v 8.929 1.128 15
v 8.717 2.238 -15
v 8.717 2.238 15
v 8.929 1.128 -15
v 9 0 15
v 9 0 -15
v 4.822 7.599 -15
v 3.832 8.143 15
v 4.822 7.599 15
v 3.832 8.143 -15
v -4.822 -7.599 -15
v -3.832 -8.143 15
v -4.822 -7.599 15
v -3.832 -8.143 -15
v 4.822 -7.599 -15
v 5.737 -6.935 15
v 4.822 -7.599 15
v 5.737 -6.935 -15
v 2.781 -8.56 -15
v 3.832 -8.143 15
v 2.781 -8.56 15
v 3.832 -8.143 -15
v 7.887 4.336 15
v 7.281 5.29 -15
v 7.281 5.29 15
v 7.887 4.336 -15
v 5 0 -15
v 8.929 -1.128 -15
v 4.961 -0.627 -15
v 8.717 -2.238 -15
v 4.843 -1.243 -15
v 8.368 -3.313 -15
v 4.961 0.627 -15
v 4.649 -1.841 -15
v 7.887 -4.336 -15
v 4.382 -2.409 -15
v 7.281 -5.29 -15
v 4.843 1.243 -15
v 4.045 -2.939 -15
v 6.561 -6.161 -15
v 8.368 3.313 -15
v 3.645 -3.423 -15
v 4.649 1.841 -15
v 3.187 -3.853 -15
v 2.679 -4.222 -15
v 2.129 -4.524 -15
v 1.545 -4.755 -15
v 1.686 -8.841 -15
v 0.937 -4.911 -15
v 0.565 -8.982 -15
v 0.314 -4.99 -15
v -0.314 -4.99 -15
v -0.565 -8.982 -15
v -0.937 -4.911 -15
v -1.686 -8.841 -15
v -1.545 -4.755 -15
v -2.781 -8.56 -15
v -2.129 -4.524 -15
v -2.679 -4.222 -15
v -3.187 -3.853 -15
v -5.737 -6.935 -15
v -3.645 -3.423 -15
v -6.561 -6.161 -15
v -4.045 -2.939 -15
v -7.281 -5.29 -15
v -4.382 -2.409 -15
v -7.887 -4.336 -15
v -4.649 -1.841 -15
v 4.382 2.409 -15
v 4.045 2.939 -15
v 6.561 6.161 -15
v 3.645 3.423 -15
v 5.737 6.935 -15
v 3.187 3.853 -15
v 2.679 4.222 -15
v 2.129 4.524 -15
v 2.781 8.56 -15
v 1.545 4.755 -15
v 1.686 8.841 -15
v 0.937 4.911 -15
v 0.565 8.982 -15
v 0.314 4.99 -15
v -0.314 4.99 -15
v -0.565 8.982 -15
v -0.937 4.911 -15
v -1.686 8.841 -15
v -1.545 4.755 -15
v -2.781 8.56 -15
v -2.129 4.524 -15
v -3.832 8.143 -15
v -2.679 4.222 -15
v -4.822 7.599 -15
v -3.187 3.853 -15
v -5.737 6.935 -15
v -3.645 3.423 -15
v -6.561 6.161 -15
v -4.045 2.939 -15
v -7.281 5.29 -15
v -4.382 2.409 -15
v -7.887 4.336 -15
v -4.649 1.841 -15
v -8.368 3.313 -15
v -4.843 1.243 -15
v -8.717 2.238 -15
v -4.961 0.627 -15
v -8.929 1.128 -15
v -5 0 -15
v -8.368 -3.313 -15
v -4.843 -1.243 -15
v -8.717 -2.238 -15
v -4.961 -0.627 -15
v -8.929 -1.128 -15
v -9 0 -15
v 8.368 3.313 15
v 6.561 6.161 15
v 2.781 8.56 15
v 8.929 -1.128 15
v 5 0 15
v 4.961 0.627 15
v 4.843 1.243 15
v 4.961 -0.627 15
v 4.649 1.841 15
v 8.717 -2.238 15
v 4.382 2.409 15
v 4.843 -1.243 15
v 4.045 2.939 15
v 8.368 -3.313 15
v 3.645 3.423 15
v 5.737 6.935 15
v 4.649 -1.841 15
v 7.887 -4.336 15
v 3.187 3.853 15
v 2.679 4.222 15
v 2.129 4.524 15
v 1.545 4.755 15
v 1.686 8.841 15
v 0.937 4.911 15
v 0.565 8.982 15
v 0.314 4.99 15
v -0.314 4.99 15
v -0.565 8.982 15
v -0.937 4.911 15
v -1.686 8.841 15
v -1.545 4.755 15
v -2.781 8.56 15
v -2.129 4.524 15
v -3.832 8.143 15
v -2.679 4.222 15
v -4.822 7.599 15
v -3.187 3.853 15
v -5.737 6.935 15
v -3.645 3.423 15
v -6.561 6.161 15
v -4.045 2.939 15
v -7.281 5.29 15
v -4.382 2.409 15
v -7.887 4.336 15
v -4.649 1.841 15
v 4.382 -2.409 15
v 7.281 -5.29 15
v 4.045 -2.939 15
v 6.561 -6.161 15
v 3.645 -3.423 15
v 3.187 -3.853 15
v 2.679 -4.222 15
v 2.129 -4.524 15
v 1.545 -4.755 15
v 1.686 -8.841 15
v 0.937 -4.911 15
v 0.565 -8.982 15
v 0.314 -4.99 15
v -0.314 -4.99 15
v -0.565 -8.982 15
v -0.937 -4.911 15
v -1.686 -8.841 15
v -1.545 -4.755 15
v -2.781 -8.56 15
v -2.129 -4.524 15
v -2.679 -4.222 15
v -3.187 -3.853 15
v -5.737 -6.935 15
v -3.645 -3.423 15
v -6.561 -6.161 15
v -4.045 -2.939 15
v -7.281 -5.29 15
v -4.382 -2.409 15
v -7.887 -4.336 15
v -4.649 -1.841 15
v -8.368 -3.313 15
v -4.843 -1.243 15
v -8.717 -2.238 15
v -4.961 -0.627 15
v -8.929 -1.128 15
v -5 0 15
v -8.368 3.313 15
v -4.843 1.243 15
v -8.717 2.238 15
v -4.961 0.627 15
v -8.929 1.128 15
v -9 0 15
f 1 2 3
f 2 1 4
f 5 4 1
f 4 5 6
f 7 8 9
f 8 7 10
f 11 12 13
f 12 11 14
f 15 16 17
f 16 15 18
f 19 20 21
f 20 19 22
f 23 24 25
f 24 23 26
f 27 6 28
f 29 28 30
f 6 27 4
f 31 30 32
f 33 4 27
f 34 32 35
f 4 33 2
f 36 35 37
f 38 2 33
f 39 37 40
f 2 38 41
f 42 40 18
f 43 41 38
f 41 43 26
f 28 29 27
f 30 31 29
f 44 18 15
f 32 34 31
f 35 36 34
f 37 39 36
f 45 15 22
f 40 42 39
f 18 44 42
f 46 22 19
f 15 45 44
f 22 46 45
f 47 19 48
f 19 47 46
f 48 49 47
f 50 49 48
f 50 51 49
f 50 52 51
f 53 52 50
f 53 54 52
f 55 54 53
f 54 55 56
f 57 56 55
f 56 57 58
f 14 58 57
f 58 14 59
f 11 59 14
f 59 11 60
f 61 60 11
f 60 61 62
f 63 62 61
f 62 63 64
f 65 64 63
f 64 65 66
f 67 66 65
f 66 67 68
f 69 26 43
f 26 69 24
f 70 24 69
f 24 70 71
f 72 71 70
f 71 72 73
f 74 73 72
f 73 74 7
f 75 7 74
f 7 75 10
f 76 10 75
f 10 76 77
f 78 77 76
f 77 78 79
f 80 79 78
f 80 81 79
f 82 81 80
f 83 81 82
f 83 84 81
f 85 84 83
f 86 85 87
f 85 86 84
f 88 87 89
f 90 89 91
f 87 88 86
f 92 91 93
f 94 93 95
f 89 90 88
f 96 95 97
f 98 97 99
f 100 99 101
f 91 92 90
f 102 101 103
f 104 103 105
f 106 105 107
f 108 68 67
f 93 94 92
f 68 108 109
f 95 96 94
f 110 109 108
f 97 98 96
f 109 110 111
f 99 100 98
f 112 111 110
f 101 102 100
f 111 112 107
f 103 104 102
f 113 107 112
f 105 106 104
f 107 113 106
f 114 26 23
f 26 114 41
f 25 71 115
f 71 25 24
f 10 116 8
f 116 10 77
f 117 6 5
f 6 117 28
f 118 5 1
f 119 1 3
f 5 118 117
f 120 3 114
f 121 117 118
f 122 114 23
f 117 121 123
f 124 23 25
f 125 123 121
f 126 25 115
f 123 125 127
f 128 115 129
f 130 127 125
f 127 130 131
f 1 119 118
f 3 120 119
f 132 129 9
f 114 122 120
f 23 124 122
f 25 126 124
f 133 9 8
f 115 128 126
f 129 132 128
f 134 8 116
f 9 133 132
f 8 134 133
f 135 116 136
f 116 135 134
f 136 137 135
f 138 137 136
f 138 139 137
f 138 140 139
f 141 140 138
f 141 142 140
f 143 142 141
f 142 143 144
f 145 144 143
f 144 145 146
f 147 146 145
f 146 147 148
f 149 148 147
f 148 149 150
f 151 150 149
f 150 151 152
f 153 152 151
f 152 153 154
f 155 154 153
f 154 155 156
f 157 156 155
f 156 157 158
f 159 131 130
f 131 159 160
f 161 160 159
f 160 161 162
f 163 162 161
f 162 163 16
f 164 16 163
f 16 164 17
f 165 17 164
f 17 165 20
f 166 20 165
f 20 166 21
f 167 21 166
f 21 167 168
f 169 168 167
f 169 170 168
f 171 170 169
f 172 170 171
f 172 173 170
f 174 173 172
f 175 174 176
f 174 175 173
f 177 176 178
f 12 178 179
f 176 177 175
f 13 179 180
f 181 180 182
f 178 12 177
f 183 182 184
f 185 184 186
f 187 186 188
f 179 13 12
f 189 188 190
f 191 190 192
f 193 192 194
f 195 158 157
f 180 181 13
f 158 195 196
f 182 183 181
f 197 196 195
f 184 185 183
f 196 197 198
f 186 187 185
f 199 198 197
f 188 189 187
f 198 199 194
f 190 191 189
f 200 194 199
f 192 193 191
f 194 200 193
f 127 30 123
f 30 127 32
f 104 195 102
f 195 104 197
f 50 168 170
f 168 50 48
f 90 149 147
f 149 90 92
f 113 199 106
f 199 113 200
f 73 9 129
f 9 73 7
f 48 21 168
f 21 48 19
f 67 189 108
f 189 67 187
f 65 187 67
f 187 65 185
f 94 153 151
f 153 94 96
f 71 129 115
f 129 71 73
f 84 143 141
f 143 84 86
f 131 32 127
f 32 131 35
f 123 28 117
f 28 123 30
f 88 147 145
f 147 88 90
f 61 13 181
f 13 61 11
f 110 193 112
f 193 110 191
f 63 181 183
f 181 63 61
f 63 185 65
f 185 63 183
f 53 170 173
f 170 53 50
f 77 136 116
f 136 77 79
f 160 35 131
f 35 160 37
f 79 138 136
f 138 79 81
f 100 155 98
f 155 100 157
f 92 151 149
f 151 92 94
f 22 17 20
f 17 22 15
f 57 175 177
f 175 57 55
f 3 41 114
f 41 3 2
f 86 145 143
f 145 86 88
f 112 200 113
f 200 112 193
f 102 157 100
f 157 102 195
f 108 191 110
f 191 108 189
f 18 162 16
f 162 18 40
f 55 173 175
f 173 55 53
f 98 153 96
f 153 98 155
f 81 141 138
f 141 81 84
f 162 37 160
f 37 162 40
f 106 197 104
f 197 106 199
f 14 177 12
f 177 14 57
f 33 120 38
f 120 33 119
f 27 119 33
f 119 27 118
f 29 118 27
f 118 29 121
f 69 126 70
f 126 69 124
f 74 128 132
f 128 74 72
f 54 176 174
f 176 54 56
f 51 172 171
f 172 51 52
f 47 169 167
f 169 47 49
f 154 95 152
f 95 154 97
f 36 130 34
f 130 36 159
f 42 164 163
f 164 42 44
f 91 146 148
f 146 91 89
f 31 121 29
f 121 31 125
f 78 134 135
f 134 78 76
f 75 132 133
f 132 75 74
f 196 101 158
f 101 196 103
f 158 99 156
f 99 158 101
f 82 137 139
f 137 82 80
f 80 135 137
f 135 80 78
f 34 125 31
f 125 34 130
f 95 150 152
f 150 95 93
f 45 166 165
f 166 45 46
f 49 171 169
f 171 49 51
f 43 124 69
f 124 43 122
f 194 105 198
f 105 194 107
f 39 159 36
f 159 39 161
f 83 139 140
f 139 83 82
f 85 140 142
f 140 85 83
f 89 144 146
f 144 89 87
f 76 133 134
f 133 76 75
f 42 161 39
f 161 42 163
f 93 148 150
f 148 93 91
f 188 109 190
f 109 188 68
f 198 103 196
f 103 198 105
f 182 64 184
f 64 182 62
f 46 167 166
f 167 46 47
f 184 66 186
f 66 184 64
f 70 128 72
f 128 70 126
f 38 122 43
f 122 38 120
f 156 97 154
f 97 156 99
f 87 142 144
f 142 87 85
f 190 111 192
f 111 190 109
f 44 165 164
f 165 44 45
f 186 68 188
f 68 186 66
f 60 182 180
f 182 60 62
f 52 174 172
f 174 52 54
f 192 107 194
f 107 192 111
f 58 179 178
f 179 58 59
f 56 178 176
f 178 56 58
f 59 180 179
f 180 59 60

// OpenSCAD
$fn = 50;


difference() {
	union() {
		translate(v = [0, 0, -15.0000000000]) {
			cylinder(h = 30, r = 9.0000000000);
		}
	}
	union() {
		translate(v = [0, 0, -100.0000000000]) {
			cylinder(h = 200, r = 5.0000000000);
		}
	}
}
